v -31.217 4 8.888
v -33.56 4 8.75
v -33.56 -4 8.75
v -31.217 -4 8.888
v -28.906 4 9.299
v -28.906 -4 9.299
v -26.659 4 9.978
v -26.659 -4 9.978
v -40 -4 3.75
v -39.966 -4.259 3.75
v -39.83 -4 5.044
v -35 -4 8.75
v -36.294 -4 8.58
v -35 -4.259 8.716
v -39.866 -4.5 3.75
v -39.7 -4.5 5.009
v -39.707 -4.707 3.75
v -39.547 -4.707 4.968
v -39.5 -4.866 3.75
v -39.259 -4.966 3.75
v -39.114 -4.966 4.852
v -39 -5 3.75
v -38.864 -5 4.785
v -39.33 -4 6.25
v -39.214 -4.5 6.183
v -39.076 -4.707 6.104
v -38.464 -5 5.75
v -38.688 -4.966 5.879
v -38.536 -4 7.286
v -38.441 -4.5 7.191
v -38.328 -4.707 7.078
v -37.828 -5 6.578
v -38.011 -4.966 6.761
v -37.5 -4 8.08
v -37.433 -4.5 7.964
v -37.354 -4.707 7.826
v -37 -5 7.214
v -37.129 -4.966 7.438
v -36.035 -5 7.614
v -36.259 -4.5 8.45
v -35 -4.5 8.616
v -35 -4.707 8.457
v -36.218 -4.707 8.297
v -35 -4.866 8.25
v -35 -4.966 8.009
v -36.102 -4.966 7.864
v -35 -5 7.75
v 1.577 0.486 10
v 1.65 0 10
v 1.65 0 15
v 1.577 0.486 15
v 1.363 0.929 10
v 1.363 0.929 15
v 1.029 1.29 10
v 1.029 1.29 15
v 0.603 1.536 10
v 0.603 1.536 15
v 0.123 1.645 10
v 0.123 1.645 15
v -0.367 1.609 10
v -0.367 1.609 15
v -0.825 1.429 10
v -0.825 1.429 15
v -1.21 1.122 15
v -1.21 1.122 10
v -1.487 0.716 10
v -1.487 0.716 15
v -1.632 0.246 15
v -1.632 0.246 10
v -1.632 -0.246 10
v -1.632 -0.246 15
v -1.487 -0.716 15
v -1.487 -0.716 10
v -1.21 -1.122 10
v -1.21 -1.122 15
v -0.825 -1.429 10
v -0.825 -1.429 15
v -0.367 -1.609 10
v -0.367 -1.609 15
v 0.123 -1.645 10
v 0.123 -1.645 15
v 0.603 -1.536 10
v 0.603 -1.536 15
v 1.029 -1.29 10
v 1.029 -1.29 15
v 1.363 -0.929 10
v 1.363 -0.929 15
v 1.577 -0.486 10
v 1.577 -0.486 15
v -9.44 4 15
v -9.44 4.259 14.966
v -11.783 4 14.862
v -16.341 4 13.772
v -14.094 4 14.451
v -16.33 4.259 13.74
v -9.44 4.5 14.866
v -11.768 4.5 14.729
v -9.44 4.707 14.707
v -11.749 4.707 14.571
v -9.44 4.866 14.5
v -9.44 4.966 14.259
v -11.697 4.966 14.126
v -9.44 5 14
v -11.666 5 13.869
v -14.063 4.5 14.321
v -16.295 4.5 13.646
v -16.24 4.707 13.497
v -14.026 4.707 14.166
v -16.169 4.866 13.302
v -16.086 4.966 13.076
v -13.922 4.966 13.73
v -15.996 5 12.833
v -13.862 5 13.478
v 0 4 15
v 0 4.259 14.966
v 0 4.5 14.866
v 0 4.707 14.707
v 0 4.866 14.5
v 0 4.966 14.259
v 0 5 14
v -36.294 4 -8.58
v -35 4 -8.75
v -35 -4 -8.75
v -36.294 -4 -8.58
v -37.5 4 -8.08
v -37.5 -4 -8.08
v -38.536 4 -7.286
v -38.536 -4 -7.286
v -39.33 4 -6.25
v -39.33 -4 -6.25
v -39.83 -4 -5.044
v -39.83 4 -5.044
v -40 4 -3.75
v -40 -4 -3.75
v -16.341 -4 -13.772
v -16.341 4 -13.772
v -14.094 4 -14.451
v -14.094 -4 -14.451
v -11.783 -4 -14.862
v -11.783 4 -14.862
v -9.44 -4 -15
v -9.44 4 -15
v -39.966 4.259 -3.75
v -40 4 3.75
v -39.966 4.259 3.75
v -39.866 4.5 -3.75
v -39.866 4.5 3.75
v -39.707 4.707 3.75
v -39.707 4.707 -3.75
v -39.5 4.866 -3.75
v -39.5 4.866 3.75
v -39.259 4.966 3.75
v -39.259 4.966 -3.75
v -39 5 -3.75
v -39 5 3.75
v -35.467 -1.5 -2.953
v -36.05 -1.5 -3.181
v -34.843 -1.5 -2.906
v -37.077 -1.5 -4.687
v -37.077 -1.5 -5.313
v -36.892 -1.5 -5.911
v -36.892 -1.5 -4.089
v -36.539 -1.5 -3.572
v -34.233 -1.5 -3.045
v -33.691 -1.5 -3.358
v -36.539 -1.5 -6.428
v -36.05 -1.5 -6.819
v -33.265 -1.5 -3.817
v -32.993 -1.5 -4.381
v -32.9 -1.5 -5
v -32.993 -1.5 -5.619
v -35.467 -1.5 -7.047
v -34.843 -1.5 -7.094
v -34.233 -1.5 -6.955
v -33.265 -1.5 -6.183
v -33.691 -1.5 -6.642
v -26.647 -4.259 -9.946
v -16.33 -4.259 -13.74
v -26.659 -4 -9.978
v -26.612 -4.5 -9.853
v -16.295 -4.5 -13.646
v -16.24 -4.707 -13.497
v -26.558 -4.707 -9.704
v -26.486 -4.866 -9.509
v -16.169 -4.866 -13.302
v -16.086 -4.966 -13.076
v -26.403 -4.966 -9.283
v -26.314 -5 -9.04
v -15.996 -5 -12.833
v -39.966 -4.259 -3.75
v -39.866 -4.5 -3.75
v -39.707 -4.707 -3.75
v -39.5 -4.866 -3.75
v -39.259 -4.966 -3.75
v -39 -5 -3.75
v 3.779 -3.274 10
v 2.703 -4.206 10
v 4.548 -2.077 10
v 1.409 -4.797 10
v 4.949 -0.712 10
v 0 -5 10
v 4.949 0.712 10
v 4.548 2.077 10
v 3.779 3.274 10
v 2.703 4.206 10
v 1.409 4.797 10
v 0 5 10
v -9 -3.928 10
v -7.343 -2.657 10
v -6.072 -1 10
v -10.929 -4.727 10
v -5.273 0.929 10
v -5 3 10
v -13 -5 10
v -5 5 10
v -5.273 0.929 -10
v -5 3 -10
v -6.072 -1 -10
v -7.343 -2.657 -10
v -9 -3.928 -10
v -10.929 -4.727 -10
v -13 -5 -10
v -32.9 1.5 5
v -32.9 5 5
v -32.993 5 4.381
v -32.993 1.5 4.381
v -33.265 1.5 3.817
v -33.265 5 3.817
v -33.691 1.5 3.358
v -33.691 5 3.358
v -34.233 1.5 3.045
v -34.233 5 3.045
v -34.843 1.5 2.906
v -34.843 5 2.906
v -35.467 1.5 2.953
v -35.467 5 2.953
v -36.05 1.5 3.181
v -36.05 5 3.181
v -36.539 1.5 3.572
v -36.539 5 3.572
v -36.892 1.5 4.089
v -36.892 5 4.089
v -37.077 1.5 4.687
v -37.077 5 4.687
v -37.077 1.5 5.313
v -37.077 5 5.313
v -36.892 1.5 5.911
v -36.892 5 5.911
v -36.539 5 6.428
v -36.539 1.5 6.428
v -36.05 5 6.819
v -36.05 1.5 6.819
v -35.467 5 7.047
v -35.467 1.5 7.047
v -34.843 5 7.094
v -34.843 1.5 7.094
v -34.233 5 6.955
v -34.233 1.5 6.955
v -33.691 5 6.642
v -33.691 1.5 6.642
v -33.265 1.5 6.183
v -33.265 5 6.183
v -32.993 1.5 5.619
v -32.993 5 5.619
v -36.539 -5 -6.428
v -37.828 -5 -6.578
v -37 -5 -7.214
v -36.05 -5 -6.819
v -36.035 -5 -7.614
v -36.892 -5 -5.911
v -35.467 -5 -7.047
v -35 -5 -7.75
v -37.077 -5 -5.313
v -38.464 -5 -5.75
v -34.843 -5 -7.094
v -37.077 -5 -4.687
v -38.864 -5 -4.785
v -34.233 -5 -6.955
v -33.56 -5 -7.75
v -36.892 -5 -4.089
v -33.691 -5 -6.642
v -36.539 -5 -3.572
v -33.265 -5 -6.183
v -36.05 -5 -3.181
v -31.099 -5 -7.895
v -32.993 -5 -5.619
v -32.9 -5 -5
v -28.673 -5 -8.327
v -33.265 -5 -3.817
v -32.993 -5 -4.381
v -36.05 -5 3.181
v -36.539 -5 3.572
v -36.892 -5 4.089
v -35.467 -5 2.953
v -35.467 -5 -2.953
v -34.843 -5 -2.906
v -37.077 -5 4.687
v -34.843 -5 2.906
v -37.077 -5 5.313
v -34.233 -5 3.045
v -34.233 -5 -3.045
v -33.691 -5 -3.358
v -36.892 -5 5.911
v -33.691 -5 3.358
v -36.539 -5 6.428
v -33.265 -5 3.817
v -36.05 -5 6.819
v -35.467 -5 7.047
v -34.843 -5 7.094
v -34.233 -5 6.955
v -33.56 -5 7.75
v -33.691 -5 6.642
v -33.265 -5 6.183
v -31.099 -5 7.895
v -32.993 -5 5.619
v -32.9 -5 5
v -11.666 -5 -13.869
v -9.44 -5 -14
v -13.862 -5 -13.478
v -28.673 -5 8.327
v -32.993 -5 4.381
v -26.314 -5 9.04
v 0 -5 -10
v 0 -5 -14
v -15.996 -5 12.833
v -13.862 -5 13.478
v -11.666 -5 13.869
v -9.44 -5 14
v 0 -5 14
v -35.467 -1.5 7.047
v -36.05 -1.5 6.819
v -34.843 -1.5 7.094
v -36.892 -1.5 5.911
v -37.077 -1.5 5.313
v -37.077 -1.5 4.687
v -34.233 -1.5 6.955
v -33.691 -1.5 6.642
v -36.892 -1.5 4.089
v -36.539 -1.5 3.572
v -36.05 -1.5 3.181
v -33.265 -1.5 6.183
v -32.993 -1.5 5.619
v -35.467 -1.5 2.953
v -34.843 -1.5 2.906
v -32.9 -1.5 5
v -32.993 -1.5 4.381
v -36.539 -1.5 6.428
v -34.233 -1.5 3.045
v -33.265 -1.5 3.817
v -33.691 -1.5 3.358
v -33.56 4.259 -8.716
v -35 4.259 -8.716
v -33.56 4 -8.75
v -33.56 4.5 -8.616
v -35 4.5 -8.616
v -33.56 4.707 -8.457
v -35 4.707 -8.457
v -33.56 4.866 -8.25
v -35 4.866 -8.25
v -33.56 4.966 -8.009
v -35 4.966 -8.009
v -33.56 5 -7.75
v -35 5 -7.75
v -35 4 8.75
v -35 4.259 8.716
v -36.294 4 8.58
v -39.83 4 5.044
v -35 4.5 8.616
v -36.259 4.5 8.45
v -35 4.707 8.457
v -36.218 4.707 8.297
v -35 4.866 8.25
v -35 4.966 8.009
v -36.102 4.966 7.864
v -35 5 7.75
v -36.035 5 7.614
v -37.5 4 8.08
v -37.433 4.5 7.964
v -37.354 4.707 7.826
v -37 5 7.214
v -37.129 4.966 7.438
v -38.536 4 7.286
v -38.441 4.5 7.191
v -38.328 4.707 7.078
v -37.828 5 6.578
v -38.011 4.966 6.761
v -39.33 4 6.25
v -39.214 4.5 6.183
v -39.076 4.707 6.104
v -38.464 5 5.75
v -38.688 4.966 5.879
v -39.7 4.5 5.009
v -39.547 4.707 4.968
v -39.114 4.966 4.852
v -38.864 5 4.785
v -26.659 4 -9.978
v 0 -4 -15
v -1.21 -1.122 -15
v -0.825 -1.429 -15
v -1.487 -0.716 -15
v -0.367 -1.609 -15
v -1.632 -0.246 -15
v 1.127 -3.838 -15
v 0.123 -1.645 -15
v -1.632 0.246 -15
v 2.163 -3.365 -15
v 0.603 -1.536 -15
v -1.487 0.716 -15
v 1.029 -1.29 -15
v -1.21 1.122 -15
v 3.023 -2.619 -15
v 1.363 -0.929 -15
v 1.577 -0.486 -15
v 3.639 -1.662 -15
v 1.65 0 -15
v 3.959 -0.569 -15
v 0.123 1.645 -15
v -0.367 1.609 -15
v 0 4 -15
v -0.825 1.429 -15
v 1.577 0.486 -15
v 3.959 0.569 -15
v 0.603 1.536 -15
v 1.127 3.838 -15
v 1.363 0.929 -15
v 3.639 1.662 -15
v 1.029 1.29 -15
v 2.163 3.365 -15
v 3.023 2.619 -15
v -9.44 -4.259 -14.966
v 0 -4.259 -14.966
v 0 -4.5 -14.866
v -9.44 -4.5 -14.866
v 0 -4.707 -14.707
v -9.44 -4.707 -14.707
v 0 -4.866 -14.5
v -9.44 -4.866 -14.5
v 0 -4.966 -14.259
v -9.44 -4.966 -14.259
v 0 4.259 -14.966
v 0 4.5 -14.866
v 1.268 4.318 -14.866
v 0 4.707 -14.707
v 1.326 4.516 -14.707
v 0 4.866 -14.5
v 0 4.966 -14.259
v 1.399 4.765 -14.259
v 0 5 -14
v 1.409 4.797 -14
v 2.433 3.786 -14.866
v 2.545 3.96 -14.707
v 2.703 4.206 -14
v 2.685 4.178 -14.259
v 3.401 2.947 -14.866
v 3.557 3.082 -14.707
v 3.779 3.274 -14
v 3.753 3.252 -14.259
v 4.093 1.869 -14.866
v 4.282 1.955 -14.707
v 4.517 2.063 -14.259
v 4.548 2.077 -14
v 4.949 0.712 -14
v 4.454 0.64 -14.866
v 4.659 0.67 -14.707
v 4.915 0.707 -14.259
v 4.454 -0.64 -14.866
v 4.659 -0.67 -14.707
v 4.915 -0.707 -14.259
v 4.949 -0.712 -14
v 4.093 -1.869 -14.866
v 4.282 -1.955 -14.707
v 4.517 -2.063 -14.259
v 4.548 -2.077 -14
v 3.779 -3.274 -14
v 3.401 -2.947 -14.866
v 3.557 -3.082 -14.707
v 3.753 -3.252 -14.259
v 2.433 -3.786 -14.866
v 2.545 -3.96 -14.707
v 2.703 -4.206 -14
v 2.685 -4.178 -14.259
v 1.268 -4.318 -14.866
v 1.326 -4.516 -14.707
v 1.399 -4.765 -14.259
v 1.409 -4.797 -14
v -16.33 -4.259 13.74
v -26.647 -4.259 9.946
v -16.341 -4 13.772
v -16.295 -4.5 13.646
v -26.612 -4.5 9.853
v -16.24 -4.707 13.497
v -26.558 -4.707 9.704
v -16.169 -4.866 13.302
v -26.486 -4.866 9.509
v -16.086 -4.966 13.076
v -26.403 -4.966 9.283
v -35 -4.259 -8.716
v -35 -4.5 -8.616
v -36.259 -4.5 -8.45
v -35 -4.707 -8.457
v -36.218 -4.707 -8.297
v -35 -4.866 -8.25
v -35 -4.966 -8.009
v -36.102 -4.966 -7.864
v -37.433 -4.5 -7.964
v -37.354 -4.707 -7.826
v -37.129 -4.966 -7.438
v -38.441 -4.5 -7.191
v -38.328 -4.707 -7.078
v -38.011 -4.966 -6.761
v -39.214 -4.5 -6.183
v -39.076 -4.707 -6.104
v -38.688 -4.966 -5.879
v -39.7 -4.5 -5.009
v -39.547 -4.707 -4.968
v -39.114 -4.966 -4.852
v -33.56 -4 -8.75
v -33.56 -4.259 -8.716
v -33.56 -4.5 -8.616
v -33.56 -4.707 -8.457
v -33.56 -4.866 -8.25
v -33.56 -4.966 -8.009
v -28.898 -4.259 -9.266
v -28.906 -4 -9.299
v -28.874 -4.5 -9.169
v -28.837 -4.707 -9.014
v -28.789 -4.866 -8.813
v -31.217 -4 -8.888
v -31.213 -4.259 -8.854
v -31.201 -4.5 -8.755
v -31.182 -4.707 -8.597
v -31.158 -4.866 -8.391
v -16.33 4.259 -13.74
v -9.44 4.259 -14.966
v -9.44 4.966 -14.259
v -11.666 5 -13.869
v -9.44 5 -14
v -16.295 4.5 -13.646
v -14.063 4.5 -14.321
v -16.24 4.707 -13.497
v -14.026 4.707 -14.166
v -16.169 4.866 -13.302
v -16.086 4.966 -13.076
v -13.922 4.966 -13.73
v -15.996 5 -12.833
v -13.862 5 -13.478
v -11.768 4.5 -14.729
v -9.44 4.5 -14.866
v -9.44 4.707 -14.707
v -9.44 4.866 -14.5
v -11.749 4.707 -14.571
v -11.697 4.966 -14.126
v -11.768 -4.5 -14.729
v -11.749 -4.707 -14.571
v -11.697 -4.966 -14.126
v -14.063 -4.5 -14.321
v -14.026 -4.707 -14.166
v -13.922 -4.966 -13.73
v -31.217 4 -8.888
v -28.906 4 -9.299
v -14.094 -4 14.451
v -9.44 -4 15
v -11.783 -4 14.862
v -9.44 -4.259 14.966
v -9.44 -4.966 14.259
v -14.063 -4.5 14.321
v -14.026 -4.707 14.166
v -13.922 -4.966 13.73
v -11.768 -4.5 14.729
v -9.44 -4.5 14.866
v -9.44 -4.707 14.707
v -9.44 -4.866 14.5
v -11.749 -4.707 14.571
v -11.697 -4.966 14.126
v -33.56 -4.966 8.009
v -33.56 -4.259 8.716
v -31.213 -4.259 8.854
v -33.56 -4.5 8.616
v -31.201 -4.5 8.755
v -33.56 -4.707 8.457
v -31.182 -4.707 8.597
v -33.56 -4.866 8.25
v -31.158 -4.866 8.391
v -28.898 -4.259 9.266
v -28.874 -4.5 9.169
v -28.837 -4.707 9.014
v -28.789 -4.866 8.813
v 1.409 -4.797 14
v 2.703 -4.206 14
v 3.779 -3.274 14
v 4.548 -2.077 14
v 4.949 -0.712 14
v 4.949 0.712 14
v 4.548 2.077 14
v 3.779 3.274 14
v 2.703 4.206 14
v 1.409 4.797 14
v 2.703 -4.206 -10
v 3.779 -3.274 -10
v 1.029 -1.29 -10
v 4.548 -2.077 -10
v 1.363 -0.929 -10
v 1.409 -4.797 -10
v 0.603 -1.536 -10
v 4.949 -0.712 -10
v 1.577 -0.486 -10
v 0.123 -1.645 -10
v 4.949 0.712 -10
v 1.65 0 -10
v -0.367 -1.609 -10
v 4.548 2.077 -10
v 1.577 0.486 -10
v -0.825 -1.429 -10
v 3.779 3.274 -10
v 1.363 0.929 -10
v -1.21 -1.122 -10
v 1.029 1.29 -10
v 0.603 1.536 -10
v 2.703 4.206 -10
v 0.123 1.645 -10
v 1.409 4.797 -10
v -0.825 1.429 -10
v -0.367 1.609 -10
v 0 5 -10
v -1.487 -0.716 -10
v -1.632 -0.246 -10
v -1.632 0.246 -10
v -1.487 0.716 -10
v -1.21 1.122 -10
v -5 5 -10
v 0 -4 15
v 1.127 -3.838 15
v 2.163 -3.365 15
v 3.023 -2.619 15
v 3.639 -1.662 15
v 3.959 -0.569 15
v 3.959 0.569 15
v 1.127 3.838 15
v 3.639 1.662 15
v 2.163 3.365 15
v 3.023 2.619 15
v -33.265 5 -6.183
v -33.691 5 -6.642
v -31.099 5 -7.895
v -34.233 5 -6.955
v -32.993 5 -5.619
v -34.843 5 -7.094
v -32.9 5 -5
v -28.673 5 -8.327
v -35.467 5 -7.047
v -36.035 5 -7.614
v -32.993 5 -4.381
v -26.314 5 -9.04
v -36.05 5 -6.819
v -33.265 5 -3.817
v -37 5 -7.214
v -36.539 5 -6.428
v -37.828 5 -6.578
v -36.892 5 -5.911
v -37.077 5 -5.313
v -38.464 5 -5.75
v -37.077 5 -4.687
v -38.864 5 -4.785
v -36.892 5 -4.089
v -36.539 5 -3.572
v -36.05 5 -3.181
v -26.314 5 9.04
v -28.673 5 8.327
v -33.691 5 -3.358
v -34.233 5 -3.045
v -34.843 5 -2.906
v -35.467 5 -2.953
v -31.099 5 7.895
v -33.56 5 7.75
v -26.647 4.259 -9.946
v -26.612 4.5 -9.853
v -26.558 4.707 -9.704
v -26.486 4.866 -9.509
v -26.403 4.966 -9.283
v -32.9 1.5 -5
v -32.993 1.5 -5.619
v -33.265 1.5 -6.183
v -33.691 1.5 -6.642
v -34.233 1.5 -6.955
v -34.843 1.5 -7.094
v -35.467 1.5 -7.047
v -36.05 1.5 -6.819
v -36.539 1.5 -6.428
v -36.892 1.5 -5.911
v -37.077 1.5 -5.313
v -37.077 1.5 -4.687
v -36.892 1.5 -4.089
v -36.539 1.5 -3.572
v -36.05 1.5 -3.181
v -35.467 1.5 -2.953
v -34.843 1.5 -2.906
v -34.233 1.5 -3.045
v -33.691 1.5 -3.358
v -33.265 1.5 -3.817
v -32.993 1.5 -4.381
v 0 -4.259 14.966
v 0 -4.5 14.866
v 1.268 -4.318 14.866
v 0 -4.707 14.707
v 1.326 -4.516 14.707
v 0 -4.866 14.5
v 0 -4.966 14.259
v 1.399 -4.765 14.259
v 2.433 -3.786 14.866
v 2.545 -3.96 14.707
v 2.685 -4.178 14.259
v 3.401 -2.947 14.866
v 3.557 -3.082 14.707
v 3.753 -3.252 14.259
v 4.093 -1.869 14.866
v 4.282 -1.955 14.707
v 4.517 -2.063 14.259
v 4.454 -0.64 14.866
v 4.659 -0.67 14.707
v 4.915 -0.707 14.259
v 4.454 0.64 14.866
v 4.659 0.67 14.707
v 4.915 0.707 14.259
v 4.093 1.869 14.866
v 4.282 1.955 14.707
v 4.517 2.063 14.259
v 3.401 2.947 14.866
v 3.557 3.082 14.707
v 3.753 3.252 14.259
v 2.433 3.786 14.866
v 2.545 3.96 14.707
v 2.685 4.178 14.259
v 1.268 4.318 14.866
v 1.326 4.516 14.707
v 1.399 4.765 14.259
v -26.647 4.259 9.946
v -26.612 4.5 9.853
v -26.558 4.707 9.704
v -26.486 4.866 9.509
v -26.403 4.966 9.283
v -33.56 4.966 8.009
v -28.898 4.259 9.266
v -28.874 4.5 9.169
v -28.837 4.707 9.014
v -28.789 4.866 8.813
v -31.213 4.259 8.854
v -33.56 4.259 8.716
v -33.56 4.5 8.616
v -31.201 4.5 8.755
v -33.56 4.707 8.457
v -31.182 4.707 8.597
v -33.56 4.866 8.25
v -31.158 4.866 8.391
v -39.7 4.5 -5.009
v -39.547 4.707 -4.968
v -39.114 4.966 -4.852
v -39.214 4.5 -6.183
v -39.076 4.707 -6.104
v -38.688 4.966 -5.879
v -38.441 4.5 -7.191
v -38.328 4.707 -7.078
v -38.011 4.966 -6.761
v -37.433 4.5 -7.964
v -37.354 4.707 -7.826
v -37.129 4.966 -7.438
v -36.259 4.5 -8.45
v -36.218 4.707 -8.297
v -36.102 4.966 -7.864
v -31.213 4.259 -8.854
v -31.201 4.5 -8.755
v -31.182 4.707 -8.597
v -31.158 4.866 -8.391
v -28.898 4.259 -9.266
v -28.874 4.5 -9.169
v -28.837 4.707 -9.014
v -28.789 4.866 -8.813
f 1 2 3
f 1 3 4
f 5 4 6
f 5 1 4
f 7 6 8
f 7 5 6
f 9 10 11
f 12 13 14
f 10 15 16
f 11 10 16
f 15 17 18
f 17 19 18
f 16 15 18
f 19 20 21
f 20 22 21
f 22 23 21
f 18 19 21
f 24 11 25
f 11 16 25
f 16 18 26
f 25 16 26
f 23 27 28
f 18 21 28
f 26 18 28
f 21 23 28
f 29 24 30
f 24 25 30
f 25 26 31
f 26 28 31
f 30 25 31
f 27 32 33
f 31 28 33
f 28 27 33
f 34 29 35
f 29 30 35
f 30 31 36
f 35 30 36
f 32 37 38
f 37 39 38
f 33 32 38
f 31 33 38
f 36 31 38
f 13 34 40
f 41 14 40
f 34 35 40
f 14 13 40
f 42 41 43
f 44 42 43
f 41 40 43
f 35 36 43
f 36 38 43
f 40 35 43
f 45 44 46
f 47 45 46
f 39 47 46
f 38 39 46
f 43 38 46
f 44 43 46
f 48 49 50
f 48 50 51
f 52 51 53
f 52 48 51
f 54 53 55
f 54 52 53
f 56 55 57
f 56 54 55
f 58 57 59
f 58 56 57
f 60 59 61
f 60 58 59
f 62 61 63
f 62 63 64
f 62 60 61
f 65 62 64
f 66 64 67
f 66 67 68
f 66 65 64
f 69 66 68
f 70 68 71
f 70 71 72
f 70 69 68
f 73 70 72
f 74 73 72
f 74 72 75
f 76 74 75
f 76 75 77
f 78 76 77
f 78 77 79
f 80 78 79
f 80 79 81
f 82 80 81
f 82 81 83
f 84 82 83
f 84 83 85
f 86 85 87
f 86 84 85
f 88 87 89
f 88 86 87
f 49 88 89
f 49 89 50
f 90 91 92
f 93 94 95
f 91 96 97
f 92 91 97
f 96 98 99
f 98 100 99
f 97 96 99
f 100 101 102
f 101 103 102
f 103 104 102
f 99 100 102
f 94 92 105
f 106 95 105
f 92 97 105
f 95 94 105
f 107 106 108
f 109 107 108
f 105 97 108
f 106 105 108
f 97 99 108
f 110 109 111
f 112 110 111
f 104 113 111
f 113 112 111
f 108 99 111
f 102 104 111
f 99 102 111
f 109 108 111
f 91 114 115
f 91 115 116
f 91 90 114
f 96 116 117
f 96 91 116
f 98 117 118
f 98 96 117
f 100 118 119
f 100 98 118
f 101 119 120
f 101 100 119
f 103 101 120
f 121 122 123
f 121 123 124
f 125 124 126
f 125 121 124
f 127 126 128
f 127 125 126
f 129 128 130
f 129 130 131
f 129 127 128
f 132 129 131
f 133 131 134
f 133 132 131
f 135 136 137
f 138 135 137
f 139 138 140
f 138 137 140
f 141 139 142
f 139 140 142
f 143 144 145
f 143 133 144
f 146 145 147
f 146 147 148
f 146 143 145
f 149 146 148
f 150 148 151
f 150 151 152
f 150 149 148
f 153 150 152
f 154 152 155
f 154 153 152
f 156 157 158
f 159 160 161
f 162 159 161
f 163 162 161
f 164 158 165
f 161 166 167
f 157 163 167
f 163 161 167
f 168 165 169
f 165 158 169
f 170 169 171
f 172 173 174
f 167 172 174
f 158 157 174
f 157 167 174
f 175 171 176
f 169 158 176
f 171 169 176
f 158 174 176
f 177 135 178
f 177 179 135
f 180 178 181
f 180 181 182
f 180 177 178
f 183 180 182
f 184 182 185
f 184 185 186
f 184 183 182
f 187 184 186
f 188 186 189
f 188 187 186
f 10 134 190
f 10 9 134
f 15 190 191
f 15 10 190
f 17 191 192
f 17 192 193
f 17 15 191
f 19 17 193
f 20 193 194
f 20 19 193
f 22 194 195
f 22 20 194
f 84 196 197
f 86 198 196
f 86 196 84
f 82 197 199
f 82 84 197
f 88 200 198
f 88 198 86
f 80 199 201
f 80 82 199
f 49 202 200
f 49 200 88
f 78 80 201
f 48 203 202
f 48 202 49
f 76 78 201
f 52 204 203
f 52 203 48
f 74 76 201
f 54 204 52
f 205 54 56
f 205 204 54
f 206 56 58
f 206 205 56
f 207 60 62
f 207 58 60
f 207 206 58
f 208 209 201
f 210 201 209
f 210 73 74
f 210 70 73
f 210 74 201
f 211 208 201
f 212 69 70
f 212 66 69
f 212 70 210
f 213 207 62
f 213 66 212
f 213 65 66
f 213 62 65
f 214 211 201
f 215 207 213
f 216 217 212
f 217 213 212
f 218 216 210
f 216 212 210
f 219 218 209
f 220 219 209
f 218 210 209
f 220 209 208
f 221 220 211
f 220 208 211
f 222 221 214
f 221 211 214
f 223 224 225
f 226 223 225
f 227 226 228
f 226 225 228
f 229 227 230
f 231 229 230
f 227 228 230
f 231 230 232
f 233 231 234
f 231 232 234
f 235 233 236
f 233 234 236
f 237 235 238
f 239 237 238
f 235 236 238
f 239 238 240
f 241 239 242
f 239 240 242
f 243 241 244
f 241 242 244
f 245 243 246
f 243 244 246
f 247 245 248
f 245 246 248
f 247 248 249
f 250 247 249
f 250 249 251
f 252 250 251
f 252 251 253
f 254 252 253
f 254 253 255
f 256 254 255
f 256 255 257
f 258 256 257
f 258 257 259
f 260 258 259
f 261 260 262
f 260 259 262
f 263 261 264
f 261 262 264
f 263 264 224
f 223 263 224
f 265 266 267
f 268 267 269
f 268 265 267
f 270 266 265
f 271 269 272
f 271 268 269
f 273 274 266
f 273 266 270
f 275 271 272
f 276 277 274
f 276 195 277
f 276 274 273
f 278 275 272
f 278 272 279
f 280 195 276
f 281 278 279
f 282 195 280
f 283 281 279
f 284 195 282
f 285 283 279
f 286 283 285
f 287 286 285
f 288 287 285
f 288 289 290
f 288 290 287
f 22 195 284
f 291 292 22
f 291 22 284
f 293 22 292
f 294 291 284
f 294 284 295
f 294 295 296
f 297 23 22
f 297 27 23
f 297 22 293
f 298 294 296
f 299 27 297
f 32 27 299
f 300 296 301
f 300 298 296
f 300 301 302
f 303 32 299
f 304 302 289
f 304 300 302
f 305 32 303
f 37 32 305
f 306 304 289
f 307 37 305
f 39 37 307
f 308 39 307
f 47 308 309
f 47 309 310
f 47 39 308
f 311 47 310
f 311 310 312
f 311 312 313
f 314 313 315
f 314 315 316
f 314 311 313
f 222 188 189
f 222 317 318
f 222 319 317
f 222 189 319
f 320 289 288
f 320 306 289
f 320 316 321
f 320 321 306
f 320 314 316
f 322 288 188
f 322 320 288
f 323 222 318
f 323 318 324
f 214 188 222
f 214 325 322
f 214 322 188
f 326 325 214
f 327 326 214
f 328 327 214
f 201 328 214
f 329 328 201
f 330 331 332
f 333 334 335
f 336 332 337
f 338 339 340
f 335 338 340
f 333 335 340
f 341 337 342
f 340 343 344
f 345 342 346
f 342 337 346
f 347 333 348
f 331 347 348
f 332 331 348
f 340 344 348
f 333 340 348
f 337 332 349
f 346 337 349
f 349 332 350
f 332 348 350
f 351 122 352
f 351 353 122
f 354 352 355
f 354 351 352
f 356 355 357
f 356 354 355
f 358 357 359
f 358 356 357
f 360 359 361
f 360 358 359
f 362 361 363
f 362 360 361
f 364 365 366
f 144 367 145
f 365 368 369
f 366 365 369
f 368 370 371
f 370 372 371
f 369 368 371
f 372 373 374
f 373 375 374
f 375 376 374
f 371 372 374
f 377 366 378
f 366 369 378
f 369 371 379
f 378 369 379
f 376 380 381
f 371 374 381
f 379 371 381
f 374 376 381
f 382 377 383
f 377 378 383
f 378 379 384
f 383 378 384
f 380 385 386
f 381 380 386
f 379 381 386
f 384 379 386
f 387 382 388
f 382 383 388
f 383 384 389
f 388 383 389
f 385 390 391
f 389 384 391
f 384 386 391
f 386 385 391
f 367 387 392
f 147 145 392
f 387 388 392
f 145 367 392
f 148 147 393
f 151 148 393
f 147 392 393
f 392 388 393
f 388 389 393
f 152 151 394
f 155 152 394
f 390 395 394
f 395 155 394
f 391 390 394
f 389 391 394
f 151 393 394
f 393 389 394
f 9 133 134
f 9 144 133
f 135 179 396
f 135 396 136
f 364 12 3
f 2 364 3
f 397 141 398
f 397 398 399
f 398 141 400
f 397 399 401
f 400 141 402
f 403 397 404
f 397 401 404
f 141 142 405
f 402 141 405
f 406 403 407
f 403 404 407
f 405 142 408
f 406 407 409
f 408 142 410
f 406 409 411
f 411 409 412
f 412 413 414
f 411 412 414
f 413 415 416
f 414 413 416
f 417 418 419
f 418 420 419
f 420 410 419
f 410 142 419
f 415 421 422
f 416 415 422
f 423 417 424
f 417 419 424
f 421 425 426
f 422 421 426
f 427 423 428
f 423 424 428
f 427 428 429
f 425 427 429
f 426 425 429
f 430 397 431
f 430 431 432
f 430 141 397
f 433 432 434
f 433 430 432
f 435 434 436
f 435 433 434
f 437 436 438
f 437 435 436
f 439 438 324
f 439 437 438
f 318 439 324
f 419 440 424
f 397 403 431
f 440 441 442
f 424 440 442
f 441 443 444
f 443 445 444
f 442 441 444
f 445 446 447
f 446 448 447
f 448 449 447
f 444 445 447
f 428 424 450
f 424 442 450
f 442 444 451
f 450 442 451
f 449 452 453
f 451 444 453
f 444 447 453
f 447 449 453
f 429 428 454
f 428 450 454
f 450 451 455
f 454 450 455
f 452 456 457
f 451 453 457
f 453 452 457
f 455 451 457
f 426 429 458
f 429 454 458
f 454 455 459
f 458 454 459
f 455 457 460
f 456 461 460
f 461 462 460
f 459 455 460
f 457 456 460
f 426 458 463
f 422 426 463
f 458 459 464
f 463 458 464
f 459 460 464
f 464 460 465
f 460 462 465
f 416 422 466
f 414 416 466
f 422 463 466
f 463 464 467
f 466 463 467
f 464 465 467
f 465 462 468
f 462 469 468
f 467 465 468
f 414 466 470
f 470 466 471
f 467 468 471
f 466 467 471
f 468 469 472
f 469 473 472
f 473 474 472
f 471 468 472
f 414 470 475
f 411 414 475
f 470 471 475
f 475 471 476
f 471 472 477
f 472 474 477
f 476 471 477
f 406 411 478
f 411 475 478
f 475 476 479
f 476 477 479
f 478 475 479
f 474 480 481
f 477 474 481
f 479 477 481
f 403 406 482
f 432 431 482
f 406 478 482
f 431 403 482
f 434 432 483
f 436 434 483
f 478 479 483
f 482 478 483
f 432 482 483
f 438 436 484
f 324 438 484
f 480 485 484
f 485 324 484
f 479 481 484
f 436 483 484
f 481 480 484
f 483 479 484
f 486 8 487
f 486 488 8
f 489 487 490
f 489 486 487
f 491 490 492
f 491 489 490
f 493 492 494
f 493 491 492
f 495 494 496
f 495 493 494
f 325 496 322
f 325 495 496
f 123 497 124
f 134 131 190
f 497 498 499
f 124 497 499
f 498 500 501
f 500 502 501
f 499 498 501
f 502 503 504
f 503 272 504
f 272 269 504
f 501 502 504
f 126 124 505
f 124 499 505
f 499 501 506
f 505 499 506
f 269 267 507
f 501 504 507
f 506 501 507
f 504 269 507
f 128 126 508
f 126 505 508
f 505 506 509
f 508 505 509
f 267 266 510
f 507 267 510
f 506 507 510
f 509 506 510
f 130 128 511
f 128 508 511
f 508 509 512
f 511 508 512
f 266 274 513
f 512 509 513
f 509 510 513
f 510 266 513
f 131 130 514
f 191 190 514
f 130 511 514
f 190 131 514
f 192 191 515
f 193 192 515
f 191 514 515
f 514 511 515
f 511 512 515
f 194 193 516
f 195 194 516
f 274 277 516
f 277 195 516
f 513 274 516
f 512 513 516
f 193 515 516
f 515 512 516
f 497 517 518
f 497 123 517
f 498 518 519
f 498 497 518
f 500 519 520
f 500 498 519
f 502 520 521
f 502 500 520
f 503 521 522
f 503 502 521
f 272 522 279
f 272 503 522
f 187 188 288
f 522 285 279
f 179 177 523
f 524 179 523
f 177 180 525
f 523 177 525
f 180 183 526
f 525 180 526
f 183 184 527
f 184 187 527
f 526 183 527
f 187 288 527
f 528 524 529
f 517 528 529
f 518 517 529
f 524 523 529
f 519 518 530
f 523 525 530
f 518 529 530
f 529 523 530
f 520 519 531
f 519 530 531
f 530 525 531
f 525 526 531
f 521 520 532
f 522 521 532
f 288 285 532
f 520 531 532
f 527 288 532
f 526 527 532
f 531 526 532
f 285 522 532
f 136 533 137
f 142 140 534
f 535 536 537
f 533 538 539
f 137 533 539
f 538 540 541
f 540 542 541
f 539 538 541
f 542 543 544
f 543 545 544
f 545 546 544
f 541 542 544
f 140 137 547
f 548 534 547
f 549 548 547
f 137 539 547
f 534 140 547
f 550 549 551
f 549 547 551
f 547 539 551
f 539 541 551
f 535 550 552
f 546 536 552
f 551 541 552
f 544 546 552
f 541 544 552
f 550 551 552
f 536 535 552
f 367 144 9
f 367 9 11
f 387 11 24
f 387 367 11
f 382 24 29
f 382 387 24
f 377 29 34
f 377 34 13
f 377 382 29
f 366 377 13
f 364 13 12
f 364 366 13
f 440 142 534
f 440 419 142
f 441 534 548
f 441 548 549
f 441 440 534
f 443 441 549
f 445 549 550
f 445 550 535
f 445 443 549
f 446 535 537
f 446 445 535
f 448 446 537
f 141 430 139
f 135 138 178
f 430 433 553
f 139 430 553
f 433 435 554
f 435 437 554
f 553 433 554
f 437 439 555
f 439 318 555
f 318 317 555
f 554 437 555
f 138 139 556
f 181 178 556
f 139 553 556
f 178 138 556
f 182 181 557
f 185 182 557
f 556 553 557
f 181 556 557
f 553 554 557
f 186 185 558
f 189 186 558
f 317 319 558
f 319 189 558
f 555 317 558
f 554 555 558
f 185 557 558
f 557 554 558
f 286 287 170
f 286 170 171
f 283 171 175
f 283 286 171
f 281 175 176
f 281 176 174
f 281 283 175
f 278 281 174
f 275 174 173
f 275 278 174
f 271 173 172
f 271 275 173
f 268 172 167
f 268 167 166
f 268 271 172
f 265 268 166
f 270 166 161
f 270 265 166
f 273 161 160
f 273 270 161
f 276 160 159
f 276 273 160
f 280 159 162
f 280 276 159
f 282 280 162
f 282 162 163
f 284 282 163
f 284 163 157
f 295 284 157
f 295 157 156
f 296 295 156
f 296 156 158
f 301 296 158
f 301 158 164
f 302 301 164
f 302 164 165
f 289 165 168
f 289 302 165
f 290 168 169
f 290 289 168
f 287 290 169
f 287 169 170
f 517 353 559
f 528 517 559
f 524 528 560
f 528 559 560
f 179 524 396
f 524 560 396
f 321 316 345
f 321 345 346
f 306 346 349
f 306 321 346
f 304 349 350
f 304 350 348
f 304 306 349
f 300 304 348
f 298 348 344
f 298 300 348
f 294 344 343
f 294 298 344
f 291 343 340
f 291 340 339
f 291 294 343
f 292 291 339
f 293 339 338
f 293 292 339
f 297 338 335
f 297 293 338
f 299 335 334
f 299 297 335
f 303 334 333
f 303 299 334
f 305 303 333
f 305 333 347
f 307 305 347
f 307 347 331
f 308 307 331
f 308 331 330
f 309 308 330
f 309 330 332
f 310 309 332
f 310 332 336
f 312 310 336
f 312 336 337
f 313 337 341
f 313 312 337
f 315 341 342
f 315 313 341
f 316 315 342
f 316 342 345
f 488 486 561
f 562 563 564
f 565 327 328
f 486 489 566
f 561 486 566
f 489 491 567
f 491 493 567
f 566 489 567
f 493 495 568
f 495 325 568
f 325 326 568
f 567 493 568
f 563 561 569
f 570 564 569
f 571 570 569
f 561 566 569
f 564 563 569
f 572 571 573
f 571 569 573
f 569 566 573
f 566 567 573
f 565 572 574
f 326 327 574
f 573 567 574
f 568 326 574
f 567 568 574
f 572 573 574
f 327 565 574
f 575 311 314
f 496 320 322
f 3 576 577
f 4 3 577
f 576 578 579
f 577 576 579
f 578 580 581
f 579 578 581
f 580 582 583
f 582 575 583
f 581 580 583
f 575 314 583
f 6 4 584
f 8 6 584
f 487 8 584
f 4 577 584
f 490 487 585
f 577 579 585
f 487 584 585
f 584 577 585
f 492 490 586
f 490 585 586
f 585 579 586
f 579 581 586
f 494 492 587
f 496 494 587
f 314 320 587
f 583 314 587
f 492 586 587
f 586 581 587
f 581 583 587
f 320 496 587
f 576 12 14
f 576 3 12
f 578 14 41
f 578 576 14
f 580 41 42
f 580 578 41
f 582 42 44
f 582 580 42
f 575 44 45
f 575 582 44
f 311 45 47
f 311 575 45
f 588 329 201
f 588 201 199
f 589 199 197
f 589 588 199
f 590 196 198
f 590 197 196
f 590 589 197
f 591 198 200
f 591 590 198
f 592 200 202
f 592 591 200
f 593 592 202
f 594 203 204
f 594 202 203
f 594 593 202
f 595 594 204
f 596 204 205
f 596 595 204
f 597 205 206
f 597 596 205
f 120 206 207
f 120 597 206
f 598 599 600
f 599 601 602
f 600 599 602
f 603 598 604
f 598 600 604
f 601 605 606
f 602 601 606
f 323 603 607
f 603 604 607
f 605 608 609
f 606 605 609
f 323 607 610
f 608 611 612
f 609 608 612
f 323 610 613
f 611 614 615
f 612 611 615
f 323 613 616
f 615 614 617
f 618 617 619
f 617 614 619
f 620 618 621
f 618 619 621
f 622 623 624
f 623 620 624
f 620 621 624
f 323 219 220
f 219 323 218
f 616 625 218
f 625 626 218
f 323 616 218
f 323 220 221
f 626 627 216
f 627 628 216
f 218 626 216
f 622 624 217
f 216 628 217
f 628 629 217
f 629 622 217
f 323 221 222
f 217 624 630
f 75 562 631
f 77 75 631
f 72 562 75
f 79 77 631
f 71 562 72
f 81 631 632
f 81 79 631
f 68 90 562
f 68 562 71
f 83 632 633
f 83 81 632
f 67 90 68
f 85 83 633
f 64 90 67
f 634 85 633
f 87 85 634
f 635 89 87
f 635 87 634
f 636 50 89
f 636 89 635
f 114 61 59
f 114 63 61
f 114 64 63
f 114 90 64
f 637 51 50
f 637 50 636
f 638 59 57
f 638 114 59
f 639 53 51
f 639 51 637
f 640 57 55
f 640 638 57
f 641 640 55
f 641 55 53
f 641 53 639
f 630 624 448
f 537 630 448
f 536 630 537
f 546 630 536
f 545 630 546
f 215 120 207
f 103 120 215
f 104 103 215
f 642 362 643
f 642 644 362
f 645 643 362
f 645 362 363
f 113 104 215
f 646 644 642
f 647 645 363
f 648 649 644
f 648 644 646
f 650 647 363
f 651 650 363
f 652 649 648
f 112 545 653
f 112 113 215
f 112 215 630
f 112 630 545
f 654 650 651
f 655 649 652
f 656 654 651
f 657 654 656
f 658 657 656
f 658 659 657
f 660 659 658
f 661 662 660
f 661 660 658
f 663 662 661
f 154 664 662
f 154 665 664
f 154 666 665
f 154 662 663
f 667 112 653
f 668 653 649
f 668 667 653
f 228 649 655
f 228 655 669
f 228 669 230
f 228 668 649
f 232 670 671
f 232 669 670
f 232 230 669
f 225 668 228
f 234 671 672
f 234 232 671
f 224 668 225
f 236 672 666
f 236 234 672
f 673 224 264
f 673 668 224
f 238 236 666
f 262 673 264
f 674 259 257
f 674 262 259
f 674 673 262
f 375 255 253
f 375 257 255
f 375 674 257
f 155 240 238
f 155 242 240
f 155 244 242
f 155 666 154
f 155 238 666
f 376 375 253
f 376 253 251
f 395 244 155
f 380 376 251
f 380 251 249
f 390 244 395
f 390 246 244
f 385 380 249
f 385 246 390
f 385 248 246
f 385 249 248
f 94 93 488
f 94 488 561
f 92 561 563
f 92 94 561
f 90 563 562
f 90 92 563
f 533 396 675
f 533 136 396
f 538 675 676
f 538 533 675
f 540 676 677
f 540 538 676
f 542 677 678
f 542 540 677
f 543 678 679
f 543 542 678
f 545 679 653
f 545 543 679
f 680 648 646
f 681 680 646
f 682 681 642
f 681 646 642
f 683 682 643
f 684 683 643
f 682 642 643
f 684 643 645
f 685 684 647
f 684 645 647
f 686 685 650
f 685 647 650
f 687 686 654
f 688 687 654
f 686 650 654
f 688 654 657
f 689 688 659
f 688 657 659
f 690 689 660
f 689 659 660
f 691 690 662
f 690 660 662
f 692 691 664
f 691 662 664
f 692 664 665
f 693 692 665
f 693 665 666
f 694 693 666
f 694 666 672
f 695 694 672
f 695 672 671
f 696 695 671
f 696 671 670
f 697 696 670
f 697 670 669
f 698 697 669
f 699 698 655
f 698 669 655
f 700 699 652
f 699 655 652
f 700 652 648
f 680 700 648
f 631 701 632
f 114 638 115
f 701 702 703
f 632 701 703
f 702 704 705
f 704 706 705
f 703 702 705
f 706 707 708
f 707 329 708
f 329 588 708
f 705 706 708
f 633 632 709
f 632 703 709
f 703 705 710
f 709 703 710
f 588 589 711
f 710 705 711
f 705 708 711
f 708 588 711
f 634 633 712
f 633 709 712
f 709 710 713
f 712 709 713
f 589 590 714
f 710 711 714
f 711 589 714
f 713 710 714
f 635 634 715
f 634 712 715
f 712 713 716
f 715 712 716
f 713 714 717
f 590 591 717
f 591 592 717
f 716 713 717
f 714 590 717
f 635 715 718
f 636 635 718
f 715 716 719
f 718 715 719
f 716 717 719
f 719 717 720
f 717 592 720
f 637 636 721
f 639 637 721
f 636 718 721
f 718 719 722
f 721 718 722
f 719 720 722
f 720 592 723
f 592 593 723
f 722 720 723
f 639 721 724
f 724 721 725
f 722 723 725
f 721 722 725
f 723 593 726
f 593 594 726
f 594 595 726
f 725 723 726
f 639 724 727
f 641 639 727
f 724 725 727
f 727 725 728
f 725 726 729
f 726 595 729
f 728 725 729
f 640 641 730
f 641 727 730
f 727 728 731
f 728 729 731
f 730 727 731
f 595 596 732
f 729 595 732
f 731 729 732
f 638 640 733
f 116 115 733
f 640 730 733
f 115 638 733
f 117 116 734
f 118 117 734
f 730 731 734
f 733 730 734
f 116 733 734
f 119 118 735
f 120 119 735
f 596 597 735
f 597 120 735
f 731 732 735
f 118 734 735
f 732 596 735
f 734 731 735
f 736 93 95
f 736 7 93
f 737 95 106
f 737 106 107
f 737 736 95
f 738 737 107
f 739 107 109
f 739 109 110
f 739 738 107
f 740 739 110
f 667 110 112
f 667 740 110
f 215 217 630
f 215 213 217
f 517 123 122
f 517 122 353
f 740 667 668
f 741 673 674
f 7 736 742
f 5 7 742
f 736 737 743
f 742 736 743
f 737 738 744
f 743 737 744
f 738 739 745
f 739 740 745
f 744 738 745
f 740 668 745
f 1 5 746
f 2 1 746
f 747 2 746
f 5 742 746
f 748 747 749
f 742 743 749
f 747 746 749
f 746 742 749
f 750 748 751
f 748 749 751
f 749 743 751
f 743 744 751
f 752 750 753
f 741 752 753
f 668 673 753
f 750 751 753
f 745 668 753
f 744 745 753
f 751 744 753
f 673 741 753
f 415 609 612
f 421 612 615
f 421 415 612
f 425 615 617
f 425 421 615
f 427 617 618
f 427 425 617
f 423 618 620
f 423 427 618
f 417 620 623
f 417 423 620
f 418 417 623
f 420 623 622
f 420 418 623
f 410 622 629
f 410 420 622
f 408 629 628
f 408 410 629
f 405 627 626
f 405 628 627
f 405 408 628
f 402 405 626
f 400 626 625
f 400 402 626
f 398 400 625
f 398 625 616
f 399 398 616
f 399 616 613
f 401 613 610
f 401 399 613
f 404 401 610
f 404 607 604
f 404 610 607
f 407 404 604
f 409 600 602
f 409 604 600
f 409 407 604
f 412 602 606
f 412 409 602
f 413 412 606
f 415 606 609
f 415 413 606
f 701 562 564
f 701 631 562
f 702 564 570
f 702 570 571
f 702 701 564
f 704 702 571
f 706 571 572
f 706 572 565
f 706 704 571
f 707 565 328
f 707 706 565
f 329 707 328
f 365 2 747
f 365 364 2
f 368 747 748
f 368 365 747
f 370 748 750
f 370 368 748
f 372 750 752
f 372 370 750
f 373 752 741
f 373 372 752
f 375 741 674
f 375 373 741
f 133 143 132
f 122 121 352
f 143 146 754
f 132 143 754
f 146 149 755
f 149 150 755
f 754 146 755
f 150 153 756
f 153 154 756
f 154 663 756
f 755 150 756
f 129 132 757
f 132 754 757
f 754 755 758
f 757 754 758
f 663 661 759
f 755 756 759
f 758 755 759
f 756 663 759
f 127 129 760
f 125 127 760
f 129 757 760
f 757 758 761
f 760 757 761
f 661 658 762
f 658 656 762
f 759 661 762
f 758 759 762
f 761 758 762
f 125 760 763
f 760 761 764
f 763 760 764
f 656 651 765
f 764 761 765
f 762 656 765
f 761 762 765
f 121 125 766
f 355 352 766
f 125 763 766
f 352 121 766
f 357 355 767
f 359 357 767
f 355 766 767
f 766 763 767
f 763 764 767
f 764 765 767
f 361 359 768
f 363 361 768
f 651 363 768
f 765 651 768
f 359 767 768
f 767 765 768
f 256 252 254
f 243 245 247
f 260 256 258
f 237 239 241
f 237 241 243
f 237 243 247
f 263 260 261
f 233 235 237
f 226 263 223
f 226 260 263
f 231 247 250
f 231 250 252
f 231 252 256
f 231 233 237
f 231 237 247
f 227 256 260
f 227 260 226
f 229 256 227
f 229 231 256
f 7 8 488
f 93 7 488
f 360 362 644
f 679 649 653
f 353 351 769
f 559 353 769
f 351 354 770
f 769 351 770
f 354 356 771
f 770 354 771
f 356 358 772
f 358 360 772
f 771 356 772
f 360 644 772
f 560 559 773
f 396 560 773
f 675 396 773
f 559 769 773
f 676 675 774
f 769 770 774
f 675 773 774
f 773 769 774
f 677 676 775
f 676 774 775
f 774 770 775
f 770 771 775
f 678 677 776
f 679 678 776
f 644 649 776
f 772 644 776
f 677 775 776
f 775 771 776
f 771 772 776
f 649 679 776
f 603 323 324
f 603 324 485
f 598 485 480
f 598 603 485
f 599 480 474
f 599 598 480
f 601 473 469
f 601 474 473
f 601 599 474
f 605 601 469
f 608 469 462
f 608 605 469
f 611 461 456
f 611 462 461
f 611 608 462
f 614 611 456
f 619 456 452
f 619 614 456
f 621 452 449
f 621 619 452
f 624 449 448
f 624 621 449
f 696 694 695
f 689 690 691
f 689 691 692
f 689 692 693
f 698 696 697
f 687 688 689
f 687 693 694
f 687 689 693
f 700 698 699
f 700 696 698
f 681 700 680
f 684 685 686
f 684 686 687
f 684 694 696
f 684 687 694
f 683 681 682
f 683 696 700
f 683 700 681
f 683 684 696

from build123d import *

# Parameters (mm, degrees)
SKETCH1_R           = 1.65
BOSS_EXTRUDE1_DEPTH = 15
CUT_EXTRUDE1_DEPTH  = 10
FILLET1_R           = 8
CUT_EXTRUDE2_DEPTH  = 11
SKETCH4_R           = 2.1
CUT_EXTRUDE3_DEPTH  = 3.5
FILLET2_R           = 5
FILLET3_R           = 20
FILLET5_R           = 1


with BuildPart() as part:
    # Sketch1 → Boss-Extrude1 (new body, symmetric)
    with BuildSketch(Plane.XY):
        with BuildLine():
            Line((0, 5), (-40, 5))
            Line((-40, 5), (-40, -5))
            Line((-40, -5), (0, -5))
            ThreePointArc((0, -5), (5, 0), (0, 5))
        make_face()
        Circle(SKETCH1_R, mode=Mode.SUBTRACT)
    extrude(amount=BOSS_EXTRUDE1_DEPTH, both=True)

    # Sketch2 → Cut-Extrude1 (cut, symmetric)
    with BuildSketch(Plane.XY):
        with BuildLine():
            Line((-5, 5), (0, 5))
            ThreePointArc((0, 5), (5, 0), (0, -5))
            Line((0, -5), (-5, -5))
            Line((-5, -5), (-5, 5))
        make_face()
    extrude(amount=CUT_EXTRUDE1_DEPTH, both=True, mode=Mode.SUBTRACT)

    # Fillet1
    fillet1_edges = [part.edges().sort_by_distance(p)[0] for p in [
        (-5, -5, 0),
    ]]
    fillet(fillet1_edges, radius=FILLET1_R)

    # Sketch3 → Cut-Extrude2 (cut, through all)
    with BuildSketch(Plane.XZ.offset(5)):
        Polygon((-40, 8.75), (-30, 8.75), (-13, 15), (-40, 15), align=None)
        Polygon((-13, -15), (-40, -15), (-40, -8.75), (-30, -8.75), align=None)
    extrude(amount=-CUT_EXTRUDE2_DEPTH, mode=Mode.SUBTRACT)

    # Sketch4 → Cut-Extrude3 (cut)
    with BuildSketch(Plane(origin=(0, 5, 0), x_dir=(1, 0, 0), z_dir=(0, 1, 0))):
        with Locations((-35, 5)):
            Circle(SKETCH4_R)
        with Locations((-35, -5)):
            Circle(SKETCH4_R)
    cut_extrude3 = extrude(amount=-CUT_EXTRUDE3_DEPTH, mode=Mode.SUBTRACT)

    # Fillet2
    fillet2_edges = [part.edges().sort_by_distance(p)[0] for p in [
        (-40, 0, 8.75),
        (-40, 0, -8.75),
    ]]
    fillet(fillet2_edges, radius=FILLET2_R)

    # Fillet3
    fillet3_edges = [part.edges().sort_by_distance(p)[0] for p in [
        (-13, 0, 15),
        (-30, 0, 8.75),
        (-30, 0, -8.75),
        (-13, 0, -15),
    ]]
    fillet(fillet3_edges, radius=FILLET3_R)

    # Fillet5
    fillet5_edges = [part.edges().sort_by_distance(p)[0] for p in [
        (-34.279993099, -5, 8.75),
        (-34.279993099, 5, 8.75),
        (-40, -5, 0),
        (-38.535533906, -5, -7.285533906),
        (-38.535533906, -5, 7.285533906),
        (-40, 5, 0),
        (-38.535533906, 5, -7.285533906),
        (-38.535533906, 5, 7.285533906),
        (-21.5, -5, -11.875),
        (-21.5, 5, -11.875),
        (-34.279993099, -5, -8.75),
        (-4.720006901, -5, -15),
        (-4.720006901, -5, 15),
        (-21.5, -5, 11.875),
        (-12.944908854, -5, 14.690497979),
        (-12.944908854, -5, -14.690497979),
        (-21.5, 5, 11.875),
        (-34.279993099, 5, -8.75),
        (-12.944908854, 5, 14.690497979),
        (-12.944908854, 5, -14.690497979),
        (-30.055091146, -5, -9.059502021),
        (-30.055091146, 5, -9.059502021),
        (-30.055091146, -5, 9.059502021),
        (-30.055091146, 5, 9.059502021),
        (5, 0, 15),
        (-4.720006901, 5, -15),
        (5, 0, -15),
        (-4.720006901, 5, 15),
    ]]
    fillet(fillet5_edges, radius=FILLET5_R)

    # Mirror1: Cut-Extrude3 across plane
    add(cut_extrude3.mirror(Plane.ZX), mode=Mode.SUBTRACT)


solid = part.part
